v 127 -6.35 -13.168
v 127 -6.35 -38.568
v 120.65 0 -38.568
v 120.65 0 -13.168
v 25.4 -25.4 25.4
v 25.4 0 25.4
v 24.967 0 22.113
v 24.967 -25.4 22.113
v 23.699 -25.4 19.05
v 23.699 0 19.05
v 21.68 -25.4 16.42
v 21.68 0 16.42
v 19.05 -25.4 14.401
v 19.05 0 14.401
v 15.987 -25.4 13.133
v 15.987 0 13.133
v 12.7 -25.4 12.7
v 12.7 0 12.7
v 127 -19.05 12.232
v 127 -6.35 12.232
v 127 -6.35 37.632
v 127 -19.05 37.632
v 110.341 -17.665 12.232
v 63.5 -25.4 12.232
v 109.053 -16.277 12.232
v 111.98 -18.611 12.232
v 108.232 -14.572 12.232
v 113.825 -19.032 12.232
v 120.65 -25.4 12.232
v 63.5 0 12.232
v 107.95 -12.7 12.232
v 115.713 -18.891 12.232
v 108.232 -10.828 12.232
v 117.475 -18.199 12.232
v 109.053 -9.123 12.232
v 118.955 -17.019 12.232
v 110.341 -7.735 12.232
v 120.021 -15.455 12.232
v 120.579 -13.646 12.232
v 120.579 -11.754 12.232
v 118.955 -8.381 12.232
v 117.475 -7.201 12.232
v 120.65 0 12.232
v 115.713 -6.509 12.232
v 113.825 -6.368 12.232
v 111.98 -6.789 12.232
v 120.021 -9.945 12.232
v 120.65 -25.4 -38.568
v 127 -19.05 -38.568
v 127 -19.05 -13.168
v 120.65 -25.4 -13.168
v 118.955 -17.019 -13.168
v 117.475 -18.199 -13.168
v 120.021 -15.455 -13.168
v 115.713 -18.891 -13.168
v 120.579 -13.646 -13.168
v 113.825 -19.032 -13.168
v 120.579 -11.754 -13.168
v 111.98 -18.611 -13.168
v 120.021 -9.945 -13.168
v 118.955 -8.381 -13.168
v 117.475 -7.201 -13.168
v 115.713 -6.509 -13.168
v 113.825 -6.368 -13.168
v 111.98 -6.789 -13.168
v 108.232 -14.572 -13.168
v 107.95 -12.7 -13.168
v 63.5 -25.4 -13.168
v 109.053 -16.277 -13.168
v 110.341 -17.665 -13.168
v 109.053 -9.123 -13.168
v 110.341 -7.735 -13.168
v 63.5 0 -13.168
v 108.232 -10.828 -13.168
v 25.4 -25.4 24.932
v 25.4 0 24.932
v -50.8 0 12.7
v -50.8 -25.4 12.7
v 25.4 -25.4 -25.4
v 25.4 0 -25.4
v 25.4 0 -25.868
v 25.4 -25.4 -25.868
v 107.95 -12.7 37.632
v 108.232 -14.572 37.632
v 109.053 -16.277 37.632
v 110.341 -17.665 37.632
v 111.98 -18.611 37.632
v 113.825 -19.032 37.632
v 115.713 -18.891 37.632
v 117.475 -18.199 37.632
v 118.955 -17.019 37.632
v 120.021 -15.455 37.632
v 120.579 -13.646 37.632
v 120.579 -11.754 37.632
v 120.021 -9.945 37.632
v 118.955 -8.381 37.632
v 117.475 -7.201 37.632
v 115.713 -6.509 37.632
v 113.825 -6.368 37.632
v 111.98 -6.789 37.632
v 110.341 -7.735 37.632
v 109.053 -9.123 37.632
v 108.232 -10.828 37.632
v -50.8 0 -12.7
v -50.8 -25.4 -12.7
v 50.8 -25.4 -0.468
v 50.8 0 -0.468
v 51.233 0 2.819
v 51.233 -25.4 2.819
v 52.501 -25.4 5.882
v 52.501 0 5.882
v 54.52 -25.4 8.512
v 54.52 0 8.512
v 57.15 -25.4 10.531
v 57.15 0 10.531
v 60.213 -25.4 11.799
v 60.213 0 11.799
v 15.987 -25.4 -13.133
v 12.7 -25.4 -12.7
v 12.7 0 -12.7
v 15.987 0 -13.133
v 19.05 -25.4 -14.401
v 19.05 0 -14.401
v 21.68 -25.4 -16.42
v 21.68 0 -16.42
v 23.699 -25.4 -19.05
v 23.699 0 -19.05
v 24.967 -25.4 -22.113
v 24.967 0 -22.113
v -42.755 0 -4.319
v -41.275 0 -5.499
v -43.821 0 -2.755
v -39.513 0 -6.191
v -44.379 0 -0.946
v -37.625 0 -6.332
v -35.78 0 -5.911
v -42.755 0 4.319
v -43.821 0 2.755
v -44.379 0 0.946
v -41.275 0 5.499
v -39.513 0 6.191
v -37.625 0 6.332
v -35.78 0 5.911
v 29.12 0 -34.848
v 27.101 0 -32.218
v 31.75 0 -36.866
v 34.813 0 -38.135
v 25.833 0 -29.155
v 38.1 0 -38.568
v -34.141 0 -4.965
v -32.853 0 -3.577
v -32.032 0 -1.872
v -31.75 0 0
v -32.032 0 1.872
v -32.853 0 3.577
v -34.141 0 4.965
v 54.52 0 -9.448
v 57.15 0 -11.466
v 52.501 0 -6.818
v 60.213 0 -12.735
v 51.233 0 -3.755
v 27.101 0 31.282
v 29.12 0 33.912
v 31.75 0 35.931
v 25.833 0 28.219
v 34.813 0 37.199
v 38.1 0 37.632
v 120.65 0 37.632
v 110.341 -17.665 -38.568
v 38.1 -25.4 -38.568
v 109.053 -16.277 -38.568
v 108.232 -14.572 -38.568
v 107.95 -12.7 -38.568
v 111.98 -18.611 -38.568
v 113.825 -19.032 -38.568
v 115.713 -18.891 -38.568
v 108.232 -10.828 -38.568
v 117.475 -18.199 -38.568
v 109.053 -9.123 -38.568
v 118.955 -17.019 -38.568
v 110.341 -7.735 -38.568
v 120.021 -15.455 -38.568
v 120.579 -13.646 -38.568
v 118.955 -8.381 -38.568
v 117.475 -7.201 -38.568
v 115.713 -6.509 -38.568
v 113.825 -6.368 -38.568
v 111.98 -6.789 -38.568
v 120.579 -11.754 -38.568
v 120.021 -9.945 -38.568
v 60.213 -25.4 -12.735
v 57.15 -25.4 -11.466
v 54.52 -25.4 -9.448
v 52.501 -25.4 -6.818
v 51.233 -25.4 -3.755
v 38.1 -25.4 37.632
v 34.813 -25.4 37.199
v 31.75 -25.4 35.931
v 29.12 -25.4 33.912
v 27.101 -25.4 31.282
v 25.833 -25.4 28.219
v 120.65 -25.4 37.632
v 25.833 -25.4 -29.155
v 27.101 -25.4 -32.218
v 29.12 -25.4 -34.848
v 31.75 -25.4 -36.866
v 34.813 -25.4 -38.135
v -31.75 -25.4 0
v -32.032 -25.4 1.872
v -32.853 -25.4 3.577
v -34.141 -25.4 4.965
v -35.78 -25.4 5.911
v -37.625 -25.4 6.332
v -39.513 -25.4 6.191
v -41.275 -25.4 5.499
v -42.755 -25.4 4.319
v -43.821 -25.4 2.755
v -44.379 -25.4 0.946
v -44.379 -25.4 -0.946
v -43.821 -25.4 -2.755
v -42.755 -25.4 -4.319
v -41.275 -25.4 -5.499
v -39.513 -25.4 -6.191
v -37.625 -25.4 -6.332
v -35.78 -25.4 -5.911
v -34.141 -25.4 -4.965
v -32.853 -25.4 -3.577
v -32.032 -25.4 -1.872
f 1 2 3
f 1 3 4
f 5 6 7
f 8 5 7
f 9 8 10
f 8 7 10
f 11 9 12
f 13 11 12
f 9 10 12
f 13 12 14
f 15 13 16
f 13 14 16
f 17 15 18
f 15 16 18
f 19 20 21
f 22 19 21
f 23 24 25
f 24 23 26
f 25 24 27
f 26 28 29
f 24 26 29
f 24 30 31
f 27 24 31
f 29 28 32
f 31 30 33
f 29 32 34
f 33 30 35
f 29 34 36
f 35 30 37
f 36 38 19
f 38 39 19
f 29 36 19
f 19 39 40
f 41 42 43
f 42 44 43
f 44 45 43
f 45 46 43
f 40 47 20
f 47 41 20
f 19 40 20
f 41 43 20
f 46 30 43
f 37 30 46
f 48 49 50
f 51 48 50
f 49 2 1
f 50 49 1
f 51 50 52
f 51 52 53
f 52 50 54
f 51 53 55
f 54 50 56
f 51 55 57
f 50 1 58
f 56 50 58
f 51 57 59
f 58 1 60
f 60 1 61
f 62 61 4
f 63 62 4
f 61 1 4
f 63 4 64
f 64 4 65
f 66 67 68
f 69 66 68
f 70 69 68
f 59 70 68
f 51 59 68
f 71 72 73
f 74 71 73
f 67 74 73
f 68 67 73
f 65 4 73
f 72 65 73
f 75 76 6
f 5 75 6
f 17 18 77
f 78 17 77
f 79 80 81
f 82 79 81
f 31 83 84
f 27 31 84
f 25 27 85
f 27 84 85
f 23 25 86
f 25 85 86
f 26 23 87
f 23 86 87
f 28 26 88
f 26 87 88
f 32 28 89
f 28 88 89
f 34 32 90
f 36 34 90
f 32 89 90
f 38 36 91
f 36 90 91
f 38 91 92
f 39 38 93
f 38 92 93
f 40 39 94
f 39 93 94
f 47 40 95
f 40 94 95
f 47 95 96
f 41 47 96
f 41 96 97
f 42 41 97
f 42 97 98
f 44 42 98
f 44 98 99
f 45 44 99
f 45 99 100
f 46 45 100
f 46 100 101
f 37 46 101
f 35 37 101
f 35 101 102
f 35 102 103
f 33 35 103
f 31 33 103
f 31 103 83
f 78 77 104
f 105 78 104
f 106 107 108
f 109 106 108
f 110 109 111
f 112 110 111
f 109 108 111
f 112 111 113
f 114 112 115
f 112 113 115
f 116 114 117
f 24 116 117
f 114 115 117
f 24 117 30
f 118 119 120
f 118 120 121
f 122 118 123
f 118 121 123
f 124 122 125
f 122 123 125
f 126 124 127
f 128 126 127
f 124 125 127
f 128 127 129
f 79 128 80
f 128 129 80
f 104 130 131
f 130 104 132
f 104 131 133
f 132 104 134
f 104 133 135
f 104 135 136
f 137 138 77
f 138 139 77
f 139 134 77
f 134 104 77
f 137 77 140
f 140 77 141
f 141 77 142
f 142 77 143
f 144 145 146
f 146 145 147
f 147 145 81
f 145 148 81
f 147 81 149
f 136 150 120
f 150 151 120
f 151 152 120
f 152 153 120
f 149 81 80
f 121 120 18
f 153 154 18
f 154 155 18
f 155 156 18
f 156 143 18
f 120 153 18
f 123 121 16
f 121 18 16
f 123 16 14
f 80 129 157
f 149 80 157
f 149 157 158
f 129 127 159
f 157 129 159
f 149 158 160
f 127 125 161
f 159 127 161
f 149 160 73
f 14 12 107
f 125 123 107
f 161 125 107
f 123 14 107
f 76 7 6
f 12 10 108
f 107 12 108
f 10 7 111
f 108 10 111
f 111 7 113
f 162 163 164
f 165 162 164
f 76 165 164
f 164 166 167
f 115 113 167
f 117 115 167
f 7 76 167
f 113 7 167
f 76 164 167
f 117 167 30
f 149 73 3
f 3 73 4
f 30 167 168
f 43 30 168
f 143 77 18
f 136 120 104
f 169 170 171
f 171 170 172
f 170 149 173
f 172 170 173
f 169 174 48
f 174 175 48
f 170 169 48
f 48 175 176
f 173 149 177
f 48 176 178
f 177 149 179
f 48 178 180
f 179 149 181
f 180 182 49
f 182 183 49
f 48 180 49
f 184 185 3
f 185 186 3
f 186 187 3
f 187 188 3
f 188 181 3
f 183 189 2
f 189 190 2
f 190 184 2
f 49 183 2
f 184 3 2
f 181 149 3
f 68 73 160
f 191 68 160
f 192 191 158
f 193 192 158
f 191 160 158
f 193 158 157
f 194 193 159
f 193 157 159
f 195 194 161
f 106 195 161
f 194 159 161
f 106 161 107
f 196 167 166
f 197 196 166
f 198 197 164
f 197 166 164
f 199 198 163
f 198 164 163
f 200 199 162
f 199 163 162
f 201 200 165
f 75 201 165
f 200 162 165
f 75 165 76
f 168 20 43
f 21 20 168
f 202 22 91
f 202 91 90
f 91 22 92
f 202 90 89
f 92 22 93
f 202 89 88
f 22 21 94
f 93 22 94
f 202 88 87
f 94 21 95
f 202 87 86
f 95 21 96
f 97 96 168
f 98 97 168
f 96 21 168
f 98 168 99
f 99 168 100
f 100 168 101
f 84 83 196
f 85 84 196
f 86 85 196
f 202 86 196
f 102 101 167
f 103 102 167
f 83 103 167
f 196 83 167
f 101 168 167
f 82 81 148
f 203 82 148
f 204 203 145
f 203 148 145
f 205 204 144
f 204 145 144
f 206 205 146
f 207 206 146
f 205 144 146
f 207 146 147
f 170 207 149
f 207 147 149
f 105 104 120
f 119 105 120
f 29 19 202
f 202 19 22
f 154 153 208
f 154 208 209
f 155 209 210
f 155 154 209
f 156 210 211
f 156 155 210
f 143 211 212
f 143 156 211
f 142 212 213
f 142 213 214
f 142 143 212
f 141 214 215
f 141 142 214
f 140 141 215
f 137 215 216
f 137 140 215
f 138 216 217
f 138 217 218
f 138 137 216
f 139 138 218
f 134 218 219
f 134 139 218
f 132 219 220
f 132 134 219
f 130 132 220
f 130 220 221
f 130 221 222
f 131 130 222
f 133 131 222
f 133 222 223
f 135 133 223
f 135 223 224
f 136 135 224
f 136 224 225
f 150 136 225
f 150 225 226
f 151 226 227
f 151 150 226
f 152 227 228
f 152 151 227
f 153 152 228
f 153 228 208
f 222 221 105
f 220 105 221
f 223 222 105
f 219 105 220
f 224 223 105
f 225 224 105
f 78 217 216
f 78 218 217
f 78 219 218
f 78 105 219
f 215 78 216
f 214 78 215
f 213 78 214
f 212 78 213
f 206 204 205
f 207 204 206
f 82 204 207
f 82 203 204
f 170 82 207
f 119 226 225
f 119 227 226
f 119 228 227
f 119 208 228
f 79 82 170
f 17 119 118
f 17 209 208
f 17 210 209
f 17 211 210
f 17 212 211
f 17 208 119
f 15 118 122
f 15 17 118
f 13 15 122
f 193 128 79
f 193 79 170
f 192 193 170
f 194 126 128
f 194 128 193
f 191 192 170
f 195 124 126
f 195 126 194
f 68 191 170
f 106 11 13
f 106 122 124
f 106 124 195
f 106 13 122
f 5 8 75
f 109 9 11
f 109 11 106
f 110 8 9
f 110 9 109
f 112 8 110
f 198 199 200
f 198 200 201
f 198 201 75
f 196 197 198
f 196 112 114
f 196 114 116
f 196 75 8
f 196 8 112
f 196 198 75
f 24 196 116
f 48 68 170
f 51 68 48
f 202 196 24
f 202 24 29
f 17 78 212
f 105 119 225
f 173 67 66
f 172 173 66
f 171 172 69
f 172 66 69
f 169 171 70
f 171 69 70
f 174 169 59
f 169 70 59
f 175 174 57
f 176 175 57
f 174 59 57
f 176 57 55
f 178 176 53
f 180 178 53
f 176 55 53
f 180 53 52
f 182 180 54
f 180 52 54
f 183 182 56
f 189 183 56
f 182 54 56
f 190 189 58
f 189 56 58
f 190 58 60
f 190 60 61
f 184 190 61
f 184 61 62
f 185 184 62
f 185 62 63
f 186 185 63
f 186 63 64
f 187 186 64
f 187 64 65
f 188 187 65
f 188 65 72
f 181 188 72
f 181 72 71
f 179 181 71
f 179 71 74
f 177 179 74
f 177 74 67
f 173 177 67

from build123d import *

# Parameters (mm, degrees)
F0_R     = 6.35
F1_DEPTH = 25.4
F3_D     = 12.7
F4_SIZE  = 6.35


with BuildPart() as f1:
    # F0 (on Front) → F1 (new body)
    with BuildSketch(Plane.XZ):
        with BuildLine():
            Line((12.7, 12.7), (-50.8, 12.7))
            Line((-50.8, 12.7), (-50.8, -12.7))
            Line((-50.8, -12.7), (12.7, -12.7))
            ThreePointArc((12.7, -12.7), (21.680256, -16.419744), (25.4, -25.4))
            Line((25.4, -25.4), (25.4, -25.867894))
            ThreePointArc((25.4, -25.867894), (29.119744, -34.84815), (38.1, -38.567894))
            Line((38.1, -38.567894), (127, -38.567894))
            Line((127, -38.567894), (127, -13.167894))
            Line((127, -13.167894), (63.5, -13.167894))
            ThreePointArc((63.5, -13.167894), (54.519744, -9.44815), (50.8, -0.467894))
            ThreePointArc((50.8, -0.467894), (54.519744, 8.512362), (63.5, 12.232106))
            Line((63.5, 12.232106), (127, 12.232106))
            Line((127, 12.232106), (127, 37.632106))
            Line((127, 37.632106), (38.1, 37.632106))
            ThreePointArc((38.1, 37.632106), (29.119744, 33.912362), (25.4, 24.932106))
            Line((25.4, 24.932106), (25.4, 25.4))
            ThreePointArc((25.4, 25.4), (21.680256, 16.419744), (12.7, 12.7))
        make_face()
        with Locations((-38.1, 0)):
            Circle(F0_R, mode=Mode.SUBTRACT)
    extrude(amount=F1_DEPTH)

    # F3 (through all)
    with Locations(Plane(origin=(0, 0, -38.567894), x_dir=(1, 0, 0), z_dir=(0, 0, -1))):
        with Locations((114.3, 12.7)):
            Hole(F3_D / 2)

    # F4
    f4_edges = [f1.edges().sort_by_distance(p)[0] for p in [
        (127, -25.4, -25.867894),
        (127, 0, -25.867894),
        (127, -25.4, 24.932106),
        (127, 0, 24.932106),
    ]]
    chamfer(f4_edges, length=F4_SIZE)


solid = f1.part
